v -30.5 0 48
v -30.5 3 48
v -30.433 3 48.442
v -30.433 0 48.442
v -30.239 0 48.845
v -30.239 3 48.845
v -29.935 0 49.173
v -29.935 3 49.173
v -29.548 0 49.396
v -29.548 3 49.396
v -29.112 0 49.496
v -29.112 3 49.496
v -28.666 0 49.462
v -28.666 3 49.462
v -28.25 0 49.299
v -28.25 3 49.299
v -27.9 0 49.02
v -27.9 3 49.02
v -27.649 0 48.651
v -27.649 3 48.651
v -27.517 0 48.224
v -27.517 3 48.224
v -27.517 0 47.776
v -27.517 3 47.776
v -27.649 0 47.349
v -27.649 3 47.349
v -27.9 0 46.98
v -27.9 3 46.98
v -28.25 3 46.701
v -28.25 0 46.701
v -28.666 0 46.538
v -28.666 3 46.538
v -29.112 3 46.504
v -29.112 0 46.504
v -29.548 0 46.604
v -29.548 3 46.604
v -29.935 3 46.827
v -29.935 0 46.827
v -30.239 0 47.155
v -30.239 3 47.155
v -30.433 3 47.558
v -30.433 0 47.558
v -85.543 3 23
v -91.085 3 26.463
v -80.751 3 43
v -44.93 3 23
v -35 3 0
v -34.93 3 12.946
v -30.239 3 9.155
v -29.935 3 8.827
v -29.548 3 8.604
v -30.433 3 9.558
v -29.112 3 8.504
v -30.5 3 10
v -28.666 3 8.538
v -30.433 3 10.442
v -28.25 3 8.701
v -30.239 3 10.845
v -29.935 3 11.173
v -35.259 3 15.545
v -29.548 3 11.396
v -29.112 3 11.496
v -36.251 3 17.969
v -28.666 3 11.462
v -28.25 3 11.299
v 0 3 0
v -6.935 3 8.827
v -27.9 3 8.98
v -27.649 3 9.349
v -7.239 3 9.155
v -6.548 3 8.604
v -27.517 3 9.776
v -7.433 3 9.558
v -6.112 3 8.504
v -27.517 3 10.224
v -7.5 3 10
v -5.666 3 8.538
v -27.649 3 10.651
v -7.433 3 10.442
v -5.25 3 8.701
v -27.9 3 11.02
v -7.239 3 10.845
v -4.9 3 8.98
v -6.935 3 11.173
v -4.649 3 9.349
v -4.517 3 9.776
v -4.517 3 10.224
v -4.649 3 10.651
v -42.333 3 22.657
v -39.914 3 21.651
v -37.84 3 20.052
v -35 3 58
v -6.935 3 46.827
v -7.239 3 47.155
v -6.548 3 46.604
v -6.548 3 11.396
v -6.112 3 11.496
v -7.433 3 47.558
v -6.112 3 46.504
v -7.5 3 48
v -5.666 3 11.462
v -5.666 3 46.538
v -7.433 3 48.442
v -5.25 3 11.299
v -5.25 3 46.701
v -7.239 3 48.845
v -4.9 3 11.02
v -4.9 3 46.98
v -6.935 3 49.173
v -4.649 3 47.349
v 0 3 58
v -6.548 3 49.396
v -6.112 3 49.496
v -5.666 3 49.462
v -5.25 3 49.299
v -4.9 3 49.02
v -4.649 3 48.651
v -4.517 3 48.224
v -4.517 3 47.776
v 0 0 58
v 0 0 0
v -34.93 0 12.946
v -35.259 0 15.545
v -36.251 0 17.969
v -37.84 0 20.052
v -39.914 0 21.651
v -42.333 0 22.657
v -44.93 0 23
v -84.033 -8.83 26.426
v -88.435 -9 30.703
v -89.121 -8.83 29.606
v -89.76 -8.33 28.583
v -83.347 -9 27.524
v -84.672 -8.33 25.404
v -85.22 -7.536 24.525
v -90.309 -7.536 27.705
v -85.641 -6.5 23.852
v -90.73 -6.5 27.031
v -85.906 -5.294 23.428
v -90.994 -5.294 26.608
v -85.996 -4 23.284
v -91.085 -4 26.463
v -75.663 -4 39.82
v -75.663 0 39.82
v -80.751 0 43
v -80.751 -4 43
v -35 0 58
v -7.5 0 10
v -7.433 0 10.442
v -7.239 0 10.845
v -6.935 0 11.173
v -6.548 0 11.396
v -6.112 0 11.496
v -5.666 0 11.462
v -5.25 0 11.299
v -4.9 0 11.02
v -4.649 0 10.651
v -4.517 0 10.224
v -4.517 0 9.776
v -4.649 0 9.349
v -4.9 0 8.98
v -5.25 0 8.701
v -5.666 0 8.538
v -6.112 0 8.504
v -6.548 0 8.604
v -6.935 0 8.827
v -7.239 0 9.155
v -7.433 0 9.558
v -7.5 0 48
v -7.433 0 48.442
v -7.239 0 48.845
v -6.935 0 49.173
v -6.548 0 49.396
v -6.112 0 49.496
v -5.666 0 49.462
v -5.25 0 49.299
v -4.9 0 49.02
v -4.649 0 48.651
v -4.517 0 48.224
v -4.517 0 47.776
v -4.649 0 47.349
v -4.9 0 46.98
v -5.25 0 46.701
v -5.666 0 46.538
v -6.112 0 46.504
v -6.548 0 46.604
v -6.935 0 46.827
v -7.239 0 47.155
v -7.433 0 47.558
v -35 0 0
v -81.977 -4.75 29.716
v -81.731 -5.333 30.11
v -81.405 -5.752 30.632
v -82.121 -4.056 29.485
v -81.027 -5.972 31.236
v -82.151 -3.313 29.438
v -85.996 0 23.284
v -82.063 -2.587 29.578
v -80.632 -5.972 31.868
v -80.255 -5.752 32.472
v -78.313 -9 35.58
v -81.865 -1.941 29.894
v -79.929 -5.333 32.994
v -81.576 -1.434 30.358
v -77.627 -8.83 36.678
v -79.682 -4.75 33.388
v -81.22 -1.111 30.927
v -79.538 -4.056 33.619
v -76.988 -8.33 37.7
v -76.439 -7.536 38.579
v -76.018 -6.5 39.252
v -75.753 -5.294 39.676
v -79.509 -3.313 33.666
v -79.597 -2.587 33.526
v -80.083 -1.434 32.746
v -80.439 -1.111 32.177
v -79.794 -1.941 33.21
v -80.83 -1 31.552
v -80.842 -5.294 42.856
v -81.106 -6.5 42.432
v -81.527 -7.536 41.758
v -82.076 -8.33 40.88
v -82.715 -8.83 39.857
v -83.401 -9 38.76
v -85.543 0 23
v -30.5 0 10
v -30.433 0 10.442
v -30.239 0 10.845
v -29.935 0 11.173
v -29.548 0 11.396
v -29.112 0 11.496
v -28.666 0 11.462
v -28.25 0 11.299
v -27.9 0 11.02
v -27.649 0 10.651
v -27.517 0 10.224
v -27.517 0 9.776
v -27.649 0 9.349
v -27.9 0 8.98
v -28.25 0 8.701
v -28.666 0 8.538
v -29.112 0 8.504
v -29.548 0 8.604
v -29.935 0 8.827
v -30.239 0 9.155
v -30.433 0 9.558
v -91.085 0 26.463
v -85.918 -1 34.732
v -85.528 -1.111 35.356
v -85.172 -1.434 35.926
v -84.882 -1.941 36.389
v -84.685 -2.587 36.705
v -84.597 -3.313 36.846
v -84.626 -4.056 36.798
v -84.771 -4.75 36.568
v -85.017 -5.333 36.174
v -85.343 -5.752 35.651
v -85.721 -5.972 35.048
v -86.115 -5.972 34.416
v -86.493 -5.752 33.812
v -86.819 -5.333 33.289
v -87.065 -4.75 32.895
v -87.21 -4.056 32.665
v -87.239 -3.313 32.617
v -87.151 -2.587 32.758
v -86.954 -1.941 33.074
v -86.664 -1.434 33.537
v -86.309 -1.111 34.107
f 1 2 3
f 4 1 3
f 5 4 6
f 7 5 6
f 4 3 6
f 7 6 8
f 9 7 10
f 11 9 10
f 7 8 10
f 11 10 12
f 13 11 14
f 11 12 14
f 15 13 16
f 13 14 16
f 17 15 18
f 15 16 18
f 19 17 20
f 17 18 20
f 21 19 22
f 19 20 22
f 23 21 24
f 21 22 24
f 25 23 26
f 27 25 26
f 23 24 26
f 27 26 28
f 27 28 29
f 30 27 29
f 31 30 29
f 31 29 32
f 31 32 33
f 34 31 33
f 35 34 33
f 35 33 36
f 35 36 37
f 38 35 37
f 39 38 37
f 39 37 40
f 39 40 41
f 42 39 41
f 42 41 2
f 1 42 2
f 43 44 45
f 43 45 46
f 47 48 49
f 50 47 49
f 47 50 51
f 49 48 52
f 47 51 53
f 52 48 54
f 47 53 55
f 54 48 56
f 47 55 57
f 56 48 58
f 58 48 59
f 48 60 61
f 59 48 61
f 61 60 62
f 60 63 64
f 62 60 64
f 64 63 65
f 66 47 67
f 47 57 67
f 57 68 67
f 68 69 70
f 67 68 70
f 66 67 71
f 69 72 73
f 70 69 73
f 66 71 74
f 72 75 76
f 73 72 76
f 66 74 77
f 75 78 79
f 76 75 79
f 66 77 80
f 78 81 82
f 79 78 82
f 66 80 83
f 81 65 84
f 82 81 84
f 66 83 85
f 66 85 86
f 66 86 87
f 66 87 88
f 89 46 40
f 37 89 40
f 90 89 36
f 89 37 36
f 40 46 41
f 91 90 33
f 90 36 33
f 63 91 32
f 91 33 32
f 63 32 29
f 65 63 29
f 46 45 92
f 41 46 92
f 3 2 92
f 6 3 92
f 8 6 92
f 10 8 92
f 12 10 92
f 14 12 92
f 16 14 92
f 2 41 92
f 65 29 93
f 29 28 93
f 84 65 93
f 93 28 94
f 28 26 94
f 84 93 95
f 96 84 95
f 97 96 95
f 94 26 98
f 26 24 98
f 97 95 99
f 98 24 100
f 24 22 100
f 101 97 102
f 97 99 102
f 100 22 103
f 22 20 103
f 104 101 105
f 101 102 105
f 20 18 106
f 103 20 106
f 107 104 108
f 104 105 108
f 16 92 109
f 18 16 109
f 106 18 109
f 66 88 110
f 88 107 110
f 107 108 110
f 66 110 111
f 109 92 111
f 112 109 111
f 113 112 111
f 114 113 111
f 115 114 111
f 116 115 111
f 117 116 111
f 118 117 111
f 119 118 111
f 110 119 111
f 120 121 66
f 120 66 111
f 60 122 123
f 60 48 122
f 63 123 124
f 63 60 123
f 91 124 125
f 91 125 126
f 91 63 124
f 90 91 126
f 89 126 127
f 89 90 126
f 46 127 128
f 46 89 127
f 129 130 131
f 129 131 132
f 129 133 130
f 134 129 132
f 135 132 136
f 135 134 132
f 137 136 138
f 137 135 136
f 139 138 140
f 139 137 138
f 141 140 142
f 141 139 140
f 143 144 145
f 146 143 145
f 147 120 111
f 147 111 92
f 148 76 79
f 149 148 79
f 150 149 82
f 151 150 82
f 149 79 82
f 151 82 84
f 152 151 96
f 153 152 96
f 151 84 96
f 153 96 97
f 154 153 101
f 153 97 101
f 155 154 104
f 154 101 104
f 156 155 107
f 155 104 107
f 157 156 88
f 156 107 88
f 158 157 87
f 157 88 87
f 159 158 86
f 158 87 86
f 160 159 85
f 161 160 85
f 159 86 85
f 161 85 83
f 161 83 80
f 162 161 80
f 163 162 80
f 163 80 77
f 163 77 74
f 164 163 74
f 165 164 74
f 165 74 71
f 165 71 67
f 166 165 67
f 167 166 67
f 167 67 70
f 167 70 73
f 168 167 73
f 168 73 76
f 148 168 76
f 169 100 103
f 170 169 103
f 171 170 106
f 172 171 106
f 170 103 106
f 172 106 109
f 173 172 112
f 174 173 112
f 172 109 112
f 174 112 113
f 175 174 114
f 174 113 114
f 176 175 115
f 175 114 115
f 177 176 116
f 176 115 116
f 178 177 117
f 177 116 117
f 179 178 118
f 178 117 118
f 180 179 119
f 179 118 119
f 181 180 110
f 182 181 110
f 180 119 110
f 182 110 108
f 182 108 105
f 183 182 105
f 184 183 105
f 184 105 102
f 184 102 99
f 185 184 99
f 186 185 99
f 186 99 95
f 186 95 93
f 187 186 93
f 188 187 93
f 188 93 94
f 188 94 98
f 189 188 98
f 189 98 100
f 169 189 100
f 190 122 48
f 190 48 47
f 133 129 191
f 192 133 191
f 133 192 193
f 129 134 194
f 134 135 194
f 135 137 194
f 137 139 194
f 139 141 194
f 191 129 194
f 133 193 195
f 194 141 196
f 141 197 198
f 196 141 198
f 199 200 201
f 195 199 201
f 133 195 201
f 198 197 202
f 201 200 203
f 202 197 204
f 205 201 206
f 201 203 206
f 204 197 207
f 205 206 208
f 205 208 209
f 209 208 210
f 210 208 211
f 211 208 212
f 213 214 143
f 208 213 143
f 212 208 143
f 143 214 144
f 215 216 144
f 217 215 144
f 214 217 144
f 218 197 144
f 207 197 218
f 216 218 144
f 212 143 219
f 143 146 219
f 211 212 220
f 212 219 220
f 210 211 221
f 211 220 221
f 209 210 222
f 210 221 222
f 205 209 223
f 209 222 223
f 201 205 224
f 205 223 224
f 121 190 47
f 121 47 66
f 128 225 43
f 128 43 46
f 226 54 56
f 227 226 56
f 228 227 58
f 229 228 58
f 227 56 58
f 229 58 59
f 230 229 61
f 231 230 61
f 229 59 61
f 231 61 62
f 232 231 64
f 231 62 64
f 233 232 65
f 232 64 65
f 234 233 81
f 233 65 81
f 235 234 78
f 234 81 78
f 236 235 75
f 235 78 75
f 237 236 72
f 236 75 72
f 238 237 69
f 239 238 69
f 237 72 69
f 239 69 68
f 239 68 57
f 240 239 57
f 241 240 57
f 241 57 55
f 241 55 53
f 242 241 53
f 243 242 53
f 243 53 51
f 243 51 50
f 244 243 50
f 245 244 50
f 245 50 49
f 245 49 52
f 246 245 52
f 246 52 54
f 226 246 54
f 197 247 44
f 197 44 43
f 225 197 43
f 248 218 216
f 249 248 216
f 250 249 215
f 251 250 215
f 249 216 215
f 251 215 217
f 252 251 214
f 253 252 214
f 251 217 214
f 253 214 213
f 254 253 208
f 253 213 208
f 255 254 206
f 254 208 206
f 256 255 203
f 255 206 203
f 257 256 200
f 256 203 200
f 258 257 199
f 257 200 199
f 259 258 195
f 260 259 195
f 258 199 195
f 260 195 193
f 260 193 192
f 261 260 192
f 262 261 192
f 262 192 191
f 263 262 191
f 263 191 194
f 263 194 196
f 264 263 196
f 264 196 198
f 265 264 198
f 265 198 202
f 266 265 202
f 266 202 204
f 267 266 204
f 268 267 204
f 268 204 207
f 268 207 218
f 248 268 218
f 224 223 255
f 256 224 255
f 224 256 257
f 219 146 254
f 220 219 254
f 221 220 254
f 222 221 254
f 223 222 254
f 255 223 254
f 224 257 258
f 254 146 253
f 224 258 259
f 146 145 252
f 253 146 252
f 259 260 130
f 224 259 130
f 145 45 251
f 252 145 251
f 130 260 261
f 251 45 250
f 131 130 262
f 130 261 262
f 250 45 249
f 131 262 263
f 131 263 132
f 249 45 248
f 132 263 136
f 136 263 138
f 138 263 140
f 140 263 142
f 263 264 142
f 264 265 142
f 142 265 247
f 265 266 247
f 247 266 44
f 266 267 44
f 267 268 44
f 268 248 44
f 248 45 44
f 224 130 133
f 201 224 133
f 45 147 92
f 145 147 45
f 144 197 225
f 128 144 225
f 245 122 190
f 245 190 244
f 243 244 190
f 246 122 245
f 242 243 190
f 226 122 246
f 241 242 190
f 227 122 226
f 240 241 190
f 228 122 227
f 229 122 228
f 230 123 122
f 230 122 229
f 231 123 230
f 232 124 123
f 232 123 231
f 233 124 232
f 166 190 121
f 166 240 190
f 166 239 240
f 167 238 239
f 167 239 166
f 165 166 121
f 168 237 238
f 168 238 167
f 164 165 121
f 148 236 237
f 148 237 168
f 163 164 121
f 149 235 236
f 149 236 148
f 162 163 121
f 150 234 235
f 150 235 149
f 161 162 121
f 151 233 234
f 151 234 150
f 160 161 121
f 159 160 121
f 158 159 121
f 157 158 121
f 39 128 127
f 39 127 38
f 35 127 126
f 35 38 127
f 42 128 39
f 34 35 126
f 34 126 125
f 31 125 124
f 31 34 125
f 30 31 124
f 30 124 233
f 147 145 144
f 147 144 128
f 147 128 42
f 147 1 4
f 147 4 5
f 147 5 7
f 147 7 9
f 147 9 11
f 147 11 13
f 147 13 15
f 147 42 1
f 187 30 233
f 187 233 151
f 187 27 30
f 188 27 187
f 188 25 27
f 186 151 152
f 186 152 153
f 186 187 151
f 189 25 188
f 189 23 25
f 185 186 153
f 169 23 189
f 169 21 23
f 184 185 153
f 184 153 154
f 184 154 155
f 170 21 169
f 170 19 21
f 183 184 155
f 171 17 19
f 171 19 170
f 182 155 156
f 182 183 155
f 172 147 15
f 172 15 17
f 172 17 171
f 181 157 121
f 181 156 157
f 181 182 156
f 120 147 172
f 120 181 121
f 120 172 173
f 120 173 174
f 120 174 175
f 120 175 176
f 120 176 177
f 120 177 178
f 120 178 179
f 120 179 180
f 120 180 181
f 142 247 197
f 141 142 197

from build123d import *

# Parameters (mm, degrees)
F1_DEPTH = 3
F4_DEPTH = 9
F5_R     = 5
F6_D     = 3
F8_D     = 5
F9_R     = 10


with BuildPart() as f1:
    # F0 (on Front) → F1 (new body)
    with BuildSketch(Plane.XZ):
        Polygon((-35, 0), (0, 0), (0, 58), (-35, 58), (-80.7513064809, 43), (-91.0847321335, 26.4630621249), (-85.5426742387, 23), (-34.875433892, 23), align=None)
    extrude(amount=-F1_DEPTH)

    # F3 (on face) → F4 (join)
    with BuildSketch(Plane.XZ):
        Polygon((-75.663017904, 39.8204844146), (-80.7513064809, 43), (-91.0847321335, 26.4630621249), (-85.9964435565, 23.2835465396), align=None)
    extrude(amount=F4_DEPTH)

    # F5
    f5_edges = [f1.edges().sort_by_distance(p)[0] for p in [
        (-78.207162, -9, 41.410242),
        (-88.540588, -9, 24.873304),
    ]]
    fillet(f5_edges, radius=F5_R)

    # F6 (through all)
    with Locations(Plane.XZ):
        with Locations((-29, 48), (-6, 48), (-6, 10), (-29, 10)):
            Hole(F6_D / 2)

    # F8 (through all)
    with Locations(Plane(origin=(-77.3992466493, 0, 48.364417092), x_dir=(0, -1, 0), z_dir=(-0.8480480962, 0, 0.5299192642))):
        with Locations((3.5, -16.0756047815)):
            Hole(F8_D / 2)

    # F9
    f9_edges = [f1.edges().sort_by_distance(p)[0] for p in [
        (-34.875434, 1.5, 23),
    ]]
    fillet(f9_edges, radius=F9_R)


solid = f1.part
